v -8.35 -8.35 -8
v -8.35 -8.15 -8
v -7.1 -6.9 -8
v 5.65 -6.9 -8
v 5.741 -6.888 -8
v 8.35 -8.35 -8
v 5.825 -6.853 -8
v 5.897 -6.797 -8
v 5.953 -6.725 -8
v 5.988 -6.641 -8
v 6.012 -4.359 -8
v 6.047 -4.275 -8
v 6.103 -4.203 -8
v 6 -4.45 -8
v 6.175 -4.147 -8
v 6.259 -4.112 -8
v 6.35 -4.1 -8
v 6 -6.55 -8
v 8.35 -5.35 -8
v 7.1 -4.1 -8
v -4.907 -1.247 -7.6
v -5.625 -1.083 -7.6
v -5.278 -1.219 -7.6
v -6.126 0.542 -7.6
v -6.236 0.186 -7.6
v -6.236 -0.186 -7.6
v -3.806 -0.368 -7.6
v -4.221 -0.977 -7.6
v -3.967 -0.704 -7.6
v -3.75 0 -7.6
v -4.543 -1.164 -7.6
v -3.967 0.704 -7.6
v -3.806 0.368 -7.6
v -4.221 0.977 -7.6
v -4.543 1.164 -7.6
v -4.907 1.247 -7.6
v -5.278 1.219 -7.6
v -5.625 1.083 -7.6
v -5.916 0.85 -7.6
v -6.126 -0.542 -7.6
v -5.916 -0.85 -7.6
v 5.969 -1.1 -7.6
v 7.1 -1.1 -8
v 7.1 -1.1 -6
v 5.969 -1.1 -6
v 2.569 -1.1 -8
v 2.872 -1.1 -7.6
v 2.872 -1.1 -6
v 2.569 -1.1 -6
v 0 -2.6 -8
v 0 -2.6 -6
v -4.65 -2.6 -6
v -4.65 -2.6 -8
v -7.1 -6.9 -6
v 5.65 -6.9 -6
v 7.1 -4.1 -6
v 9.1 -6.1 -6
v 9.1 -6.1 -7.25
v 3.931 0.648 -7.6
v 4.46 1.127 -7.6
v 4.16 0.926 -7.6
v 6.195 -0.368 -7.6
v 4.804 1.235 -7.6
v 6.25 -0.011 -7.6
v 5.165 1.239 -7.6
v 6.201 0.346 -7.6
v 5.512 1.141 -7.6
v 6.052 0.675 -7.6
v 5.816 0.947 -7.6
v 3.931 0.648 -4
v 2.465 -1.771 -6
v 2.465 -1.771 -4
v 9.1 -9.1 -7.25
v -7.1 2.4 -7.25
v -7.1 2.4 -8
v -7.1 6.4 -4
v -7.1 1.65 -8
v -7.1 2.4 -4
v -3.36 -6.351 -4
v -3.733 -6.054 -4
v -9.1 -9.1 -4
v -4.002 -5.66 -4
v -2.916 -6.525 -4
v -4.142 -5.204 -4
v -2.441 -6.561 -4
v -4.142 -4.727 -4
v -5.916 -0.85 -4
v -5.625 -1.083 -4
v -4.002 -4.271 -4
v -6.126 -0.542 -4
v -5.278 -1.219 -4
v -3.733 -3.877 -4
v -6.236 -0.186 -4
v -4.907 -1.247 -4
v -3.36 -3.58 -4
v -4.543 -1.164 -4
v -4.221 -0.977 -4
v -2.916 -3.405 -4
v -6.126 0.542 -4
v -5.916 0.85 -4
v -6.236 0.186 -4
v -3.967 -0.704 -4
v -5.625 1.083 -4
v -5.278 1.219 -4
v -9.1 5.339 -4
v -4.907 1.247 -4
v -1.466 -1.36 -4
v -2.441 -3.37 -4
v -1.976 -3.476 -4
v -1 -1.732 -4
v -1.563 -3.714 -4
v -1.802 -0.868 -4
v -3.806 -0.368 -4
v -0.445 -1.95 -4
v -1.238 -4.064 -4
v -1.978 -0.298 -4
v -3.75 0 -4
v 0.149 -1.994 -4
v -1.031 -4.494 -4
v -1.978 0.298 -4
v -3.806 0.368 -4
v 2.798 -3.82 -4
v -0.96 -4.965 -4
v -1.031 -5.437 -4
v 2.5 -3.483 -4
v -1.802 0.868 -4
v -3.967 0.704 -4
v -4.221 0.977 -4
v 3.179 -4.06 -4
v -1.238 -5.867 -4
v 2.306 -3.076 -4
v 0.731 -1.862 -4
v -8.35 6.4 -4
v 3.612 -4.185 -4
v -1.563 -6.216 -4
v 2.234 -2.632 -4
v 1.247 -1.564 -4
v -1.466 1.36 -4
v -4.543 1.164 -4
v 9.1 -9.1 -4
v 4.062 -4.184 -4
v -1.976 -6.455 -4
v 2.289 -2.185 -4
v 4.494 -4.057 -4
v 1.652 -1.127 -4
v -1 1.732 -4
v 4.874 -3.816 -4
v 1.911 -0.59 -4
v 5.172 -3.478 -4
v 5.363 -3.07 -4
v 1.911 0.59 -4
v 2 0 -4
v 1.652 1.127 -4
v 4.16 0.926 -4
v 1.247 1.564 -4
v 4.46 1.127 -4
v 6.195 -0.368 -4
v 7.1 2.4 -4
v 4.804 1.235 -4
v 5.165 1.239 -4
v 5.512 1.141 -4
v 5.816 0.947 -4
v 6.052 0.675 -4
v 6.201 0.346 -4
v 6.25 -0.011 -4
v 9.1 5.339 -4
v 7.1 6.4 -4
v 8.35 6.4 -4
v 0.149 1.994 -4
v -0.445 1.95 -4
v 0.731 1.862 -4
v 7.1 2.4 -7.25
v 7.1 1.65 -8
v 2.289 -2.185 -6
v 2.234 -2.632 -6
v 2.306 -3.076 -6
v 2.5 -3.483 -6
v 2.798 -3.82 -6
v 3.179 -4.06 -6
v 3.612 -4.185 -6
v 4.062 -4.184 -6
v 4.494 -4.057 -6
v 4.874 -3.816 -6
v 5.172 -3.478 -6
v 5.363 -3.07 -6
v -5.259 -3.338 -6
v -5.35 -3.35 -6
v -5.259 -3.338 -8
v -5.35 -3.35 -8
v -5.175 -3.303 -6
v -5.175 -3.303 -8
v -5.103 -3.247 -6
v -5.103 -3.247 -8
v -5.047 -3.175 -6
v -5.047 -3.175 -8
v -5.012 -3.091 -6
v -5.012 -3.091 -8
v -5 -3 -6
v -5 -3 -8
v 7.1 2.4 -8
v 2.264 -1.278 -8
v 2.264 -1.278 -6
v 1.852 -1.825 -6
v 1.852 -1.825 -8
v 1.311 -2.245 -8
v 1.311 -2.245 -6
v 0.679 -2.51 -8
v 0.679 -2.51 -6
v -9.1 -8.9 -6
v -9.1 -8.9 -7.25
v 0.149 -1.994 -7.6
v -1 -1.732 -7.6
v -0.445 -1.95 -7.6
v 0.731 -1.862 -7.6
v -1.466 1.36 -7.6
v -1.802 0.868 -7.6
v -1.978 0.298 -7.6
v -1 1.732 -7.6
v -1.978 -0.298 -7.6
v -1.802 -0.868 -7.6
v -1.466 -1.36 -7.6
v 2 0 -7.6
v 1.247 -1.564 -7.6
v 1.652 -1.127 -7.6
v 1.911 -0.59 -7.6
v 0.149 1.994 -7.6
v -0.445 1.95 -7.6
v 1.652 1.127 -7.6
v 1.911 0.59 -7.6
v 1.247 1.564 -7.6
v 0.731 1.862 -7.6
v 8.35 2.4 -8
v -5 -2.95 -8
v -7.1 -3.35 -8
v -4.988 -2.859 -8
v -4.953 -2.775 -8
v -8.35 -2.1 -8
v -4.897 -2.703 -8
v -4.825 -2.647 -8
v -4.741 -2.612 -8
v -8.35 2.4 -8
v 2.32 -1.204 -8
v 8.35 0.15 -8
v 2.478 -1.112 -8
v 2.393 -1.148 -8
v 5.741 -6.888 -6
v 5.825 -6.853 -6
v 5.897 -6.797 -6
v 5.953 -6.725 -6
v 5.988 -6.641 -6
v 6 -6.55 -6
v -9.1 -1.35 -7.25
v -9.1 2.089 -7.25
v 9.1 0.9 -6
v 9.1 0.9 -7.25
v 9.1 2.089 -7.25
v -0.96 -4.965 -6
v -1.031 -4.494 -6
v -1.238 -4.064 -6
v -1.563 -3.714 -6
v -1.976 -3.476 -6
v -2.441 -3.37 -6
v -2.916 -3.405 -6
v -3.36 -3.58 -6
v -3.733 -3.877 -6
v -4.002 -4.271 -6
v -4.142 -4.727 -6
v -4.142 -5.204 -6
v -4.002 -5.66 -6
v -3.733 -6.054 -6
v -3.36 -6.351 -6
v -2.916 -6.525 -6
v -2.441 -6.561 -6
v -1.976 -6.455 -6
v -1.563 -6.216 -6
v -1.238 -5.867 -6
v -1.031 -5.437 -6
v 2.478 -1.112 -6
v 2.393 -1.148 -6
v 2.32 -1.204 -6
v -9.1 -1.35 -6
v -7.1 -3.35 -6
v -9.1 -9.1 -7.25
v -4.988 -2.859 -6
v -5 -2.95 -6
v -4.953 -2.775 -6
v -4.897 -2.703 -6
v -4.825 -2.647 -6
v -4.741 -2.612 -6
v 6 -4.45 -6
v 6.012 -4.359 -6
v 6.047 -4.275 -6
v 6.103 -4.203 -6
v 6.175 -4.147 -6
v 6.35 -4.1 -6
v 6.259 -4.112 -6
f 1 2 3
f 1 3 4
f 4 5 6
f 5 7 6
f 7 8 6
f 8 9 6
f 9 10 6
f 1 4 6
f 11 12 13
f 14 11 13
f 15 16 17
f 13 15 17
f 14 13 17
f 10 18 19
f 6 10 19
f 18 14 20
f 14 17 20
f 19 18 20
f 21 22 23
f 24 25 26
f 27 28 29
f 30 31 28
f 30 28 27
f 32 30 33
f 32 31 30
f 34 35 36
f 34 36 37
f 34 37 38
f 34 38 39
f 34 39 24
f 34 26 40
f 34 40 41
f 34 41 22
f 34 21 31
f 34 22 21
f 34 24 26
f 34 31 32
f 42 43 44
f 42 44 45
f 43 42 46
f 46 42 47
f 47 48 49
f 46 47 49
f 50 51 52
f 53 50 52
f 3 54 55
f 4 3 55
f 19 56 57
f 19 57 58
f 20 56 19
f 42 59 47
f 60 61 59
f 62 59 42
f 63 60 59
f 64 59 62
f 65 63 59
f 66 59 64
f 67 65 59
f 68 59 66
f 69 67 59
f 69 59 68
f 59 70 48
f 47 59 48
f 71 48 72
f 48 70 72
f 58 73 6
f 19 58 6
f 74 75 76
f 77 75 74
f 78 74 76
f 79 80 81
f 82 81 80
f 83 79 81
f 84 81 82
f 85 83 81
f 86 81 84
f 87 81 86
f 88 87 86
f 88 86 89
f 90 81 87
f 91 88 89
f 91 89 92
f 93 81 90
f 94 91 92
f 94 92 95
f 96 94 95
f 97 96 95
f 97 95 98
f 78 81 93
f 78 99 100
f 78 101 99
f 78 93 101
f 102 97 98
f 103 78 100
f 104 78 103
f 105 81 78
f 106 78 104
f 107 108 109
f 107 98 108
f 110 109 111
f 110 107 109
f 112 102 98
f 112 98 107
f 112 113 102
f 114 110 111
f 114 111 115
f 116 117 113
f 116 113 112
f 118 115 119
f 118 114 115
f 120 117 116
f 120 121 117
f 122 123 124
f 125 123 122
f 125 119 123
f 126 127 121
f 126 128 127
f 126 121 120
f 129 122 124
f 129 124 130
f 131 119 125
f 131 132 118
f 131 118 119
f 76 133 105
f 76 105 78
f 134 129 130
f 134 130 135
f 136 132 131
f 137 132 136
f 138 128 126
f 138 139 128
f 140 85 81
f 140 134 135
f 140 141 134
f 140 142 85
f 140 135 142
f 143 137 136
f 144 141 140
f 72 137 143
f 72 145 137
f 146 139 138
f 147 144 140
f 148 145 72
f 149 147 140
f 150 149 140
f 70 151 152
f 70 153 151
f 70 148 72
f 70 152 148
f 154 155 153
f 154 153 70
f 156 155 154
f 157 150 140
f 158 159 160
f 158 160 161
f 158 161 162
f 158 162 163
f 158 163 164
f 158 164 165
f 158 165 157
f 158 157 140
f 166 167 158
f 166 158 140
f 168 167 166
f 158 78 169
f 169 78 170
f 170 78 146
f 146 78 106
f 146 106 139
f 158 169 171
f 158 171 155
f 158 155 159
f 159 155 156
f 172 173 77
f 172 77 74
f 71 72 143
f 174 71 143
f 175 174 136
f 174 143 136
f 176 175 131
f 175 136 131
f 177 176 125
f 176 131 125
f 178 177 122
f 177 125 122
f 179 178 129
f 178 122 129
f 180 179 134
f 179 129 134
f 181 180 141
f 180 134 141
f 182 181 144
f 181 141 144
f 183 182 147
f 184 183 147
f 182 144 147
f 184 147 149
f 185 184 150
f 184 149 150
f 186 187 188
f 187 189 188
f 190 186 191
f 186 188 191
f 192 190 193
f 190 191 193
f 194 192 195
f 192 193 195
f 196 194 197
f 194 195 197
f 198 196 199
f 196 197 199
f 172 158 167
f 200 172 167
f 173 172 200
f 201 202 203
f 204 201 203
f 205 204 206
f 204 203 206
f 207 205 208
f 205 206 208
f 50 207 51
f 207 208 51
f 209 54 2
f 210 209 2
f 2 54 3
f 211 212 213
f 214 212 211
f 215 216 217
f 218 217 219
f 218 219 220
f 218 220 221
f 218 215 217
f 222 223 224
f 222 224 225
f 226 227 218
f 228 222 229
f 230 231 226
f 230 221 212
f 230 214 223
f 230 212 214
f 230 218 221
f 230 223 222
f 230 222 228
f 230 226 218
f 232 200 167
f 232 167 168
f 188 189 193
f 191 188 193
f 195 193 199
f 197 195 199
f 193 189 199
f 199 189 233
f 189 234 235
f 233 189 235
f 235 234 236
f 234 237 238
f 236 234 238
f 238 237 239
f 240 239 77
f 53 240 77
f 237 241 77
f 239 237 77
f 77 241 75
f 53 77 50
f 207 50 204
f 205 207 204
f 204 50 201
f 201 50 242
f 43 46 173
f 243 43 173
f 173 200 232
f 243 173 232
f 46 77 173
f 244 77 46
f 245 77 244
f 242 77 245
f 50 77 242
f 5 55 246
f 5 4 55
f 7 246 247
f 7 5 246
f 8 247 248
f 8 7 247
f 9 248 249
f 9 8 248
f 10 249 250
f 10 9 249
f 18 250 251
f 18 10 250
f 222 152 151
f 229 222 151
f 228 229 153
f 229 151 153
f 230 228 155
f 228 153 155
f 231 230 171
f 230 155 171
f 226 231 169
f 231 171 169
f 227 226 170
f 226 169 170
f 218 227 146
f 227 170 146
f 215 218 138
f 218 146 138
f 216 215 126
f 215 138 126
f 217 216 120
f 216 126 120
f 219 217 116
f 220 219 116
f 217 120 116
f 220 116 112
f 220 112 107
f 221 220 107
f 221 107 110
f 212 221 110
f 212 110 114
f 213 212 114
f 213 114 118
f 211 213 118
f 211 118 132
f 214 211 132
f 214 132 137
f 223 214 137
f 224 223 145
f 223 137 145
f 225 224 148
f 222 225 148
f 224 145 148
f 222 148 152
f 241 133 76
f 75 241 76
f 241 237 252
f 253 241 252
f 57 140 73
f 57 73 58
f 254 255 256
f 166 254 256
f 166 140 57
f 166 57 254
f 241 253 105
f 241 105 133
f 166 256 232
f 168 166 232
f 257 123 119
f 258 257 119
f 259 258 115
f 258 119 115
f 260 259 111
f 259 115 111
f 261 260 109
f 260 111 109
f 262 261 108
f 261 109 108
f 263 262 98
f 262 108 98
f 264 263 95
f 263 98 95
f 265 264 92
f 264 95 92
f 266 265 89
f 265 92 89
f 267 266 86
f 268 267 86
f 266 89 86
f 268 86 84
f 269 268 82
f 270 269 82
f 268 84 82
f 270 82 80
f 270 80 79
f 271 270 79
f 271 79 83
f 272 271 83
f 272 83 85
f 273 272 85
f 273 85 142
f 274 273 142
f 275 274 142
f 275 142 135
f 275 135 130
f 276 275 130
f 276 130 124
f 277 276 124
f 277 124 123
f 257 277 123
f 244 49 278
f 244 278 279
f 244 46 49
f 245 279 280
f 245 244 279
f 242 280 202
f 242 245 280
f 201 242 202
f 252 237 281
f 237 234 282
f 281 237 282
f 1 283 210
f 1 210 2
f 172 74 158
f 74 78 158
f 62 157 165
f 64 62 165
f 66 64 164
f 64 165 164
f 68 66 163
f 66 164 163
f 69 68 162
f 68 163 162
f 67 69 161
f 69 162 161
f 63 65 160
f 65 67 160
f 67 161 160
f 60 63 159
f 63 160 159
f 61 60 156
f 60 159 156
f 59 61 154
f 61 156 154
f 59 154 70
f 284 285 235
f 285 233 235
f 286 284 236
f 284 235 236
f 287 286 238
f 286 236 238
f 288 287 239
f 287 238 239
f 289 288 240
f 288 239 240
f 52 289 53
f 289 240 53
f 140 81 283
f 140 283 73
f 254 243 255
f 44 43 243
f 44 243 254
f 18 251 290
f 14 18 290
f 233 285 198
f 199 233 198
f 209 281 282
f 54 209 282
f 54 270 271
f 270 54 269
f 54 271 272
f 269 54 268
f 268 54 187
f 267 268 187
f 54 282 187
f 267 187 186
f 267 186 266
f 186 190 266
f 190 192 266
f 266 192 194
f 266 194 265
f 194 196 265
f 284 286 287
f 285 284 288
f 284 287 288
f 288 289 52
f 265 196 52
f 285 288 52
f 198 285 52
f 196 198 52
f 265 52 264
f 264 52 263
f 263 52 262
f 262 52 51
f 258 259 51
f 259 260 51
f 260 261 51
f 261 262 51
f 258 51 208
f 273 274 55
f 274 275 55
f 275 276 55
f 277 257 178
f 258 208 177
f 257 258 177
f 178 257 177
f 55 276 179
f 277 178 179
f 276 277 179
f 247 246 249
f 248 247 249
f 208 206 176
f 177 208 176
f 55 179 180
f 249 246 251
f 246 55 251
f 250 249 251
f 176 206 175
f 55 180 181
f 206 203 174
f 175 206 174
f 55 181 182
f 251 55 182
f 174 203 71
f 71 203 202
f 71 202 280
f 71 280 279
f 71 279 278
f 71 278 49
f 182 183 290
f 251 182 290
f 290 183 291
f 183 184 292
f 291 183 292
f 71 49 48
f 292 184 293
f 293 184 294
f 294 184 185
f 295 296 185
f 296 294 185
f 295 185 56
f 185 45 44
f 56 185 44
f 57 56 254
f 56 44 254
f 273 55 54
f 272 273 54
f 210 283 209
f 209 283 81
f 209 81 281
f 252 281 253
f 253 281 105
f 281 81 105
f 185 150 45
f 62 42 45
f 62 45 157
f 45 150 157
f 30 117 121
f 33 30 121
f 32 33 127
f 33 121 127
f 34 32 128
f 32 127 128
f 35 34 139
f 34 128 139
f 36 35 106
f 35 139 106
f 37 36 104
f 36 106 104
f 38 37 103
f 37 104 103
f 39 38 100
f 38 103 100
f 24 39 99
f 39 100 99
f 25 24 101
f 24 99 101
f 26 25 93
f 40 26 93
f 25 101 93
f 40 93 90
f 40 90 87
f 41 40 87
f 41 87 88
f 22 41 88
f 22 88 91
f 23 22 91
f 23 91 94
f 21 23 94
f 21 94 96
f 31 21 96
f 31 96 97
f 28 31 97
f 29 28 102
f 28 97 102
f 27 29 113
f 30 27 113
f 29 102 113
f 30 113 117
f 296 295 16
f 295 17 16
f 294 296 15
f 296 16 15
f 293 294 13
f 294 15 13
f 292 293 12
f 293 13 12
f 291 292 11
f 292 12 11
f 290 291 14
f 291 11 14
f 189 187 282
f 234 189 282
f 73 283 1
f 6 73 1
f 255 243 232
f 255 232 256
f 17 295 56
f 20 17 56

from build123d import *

# Parameters (mm, degrees)
OUTER_FRAME_EXTRUDE_DEPTH      = 4
OUTER_FRAME_EXTRUDE_DEPTH_BACK = 2
OUTSIDE_FRAME_W                = 18.2
OUTSIDE_FRAME_H                = 18.2
OUTSIDE_FRAME_W_2              = 14.2
OUTSIDE_FRAME_H_2              = 14.2
HOTSWAP_BASE_W                 = 18.2
HOTSWAP_BASE_H                 = 11.5
HOTSWAP_BASE_BLOCK_DEPTH       = 4
CUT_EXTRUDE4_DEPTH             = 16.15321748
CUT_EXTRUDE4_DEPTH_BACK        = 16.15321748
SKETCH1_W                      = 2
SKETCH1_H                      = 6.7
CUT_EXTRUDE1_DEPTH             = 4
SWITCH_PIN_HOLES_R             = 2
SWITCH_PIN_HOLES_R_2           = 1.25
SWITCH_HOLES_DEPTH             = 3.6
CUT_EXTRUDE3_REACH             = 17.153
HOTSWAP_HOLES_R                = 1.6
CHAMFER1_SIZE                  = 2
CHAMFER2_SIZE                  = 4
FILLET1_R                      = 0.35
CHAMFER3_SIZE                  = 0.75


# Some blends are built 0.0001 mm under size
with BuildPart() as part:
    # Outside Frame → Outer Frame Extrude (new, two sides: drawn at the far end of the back side and taken through both)
    with BuildSketch(Plane.XY.offset(-4).offset(-OUTER_FRAME_EXTRUDE_DEPTH_BACK)):
        Rectangle(OUTSIDE_FRAME_W, OUTSIDE_FRAME_H)
        Rectangle(OUTSIDE_FRAME_W_2, OUTSIDE_FRAME_H_2, mode=Mode.SUBTRACT)
    extrude(amount=OUTER_FRAME_EXTRUDE_DEPTH + OUTER_FRAME_EXTRUDE_DEPTH_BACK)

    # Hotswap Base → Hotswap Base Block (add)
    with BuildSketch(Plane.XY.offset(-4)):
        with Locations((0, -3.35)):
            Rectangle(HOTSWAP_BASE_W, HOTSWAP_BASE_H)
    extrude(amount=-HOTSWAP_BASE_BLOCK_DEPTH)

    # Sketch1 → Cut-Extrude4 (cut, two sides: drawn at the far end of the back side and taken through both)
    with BuildSketch(Plane(origin=(0, 0, 0), x_dir=(0, 0, -1), z_dir=(1, 0, 0)).offset(-CUT_EXTRUDE4_DEPTH_BACK)):
        with Locations((5, 5.75)):
            Rectangle(SKETCH1_W, SKETCH1_H)
    extrude(amount=CUT_EXTRUDE4_DEPTH + CUT_EXTRUDE4_DEPTH_BACK, mode=Mode.SUBTRACT)

    # Hotswap Well → Cut-Extrude1 (cut)
    with BuildSketch(Plane(origin=(0, 0, -6), x_dir=(-1, 0, 0), z_dir=(0, 0, -1))):
        with BuildLine():
            Line((-10, -1.1), (-2.355843798, -1.1))
            ThreePointArc((-2.355843798, -1.1), (-1.396424004, -2.19317122), (0, -2.6))
            Line((0, -2.6), (5, -2.6))
            Line((5, -2.6), (5, -3.35))
            Line((5, -3.35), (10, -3.35))
            Line((10, -3.35), (10, -6.9))
            Line((10, -6.9), (-6, -6.9))
            Line((-6, -6.9), (-6, -4.1))
            Line((-6, -4.1), (-10, -4.1))
            Line((-10, -4.1), (-10, -1.1))
        make_face()
    extrude(amount=CUT_EXTRUDE1_DEPTH, mode=Mode.SUBTRACT)

    # Switch Pin Holes → Switch Holes (cut)
    with BuildSketch(Plane.XY.offset(-4)):
        Circle(SWITCH_PIN_HOLES_R)
        with Locations((-5, 0)):
            Circle(SWITCH_PIN_HOLES_R_2)
        with Locations((5, 0)):
            Circle(SWITCH_PIN_HOLES_R_2)
    extrude(amount=-SWITCH_HOLES_DEPTH, mode=Mode.SUBTRACT)

    # Cut-Extrude3: up to this face of the body (flat: up to its plane)
    cut_extrude3_end = Plane(part.part.faces().sort_by_distance((5, 0.029137252, -7.6))[0])
    # Hotswap Holes → Cut-Extrude3 (cut, up to the picked face)
    with BuildSketch(Plane.XY, mode=Mode.PRIVATE) as cut_extrude3_sk1:
        with Locations((-2.560136595, -4.965291588)):
            Circle(HOTSWAP_HOLES_R)
    cut_extrude3_tool1 = split(extrude(cut_extrude3_sk1.sketch, amount=-CUT_EXTRUDE3_REACH, mode=Mode.PRIVATE), bisect_by=cut_extrude3_end, keep=Keep.BOTH, mode=Mode.PRIVATE)
    # Hotswap Holes → Cut-Extrude3 (cut, up to the picked face)
    with BuildSketch(Plane.XY, mode=Mode.PRIVATE) as cut_extrude3_sk2:
        with BuildLine():
            Line((3.930924016, 0.647747281), (2.46548889, -1.77088348))
            ThreePointArc((2.46548889, -1.77088348), (3.179147124, -4.059894044), (5.3631684, -3.070485887))
            Line((5.3631684, -3.070485887), (6.194736133, -0.367567099))
            ThreePointArc((6.194736133, -0.367567099), (5.511530489, 1.140542222), (3.930924016, 0.647747281))
        make_face()
    cut_extrude3_tool2 = split(extrude(cut_extrude3_sk2.sketch, amount=-CUT_EXTRUDE3_REACH, mode=Mode.PRIVATE), bisect_by=cut_extrude3_end, keep=Keep.BOTH, mode=Mode.PRIVATE)
    add(cut_extrude3_tool1.solids().sort_by(Axis((-2.560137, -4.965292, 0), (0, 0, -1)))[0], mode=Mode.SUBTRACT)
    add(cut_extrude3_tool2.solids().sort_by(Axis((4.301523, -1.557372, 0), (0, 0, -1)))[0], mode=Mode.SUBTRACT)

    # Chamfer1
    chamfer1_edges = [part.edges().sort_by_distance(p)[0] for p in [
        (9.1, -4.1, -7),
        (-9.1, -6.9, -7),
        (-9.1, -3.35, -7),
        (9.1, -1.1, -7),
    ]]
    chamfer(chamfer1_edges, length=CHAMFER1_SIZE)

    # Chamfer2
    chamfer2_edges = [part.edges().sort_by_distance(p)[0] for p in [
        (-8.1, 2.4, -4),
        (8.1, 2.4, -4),
    ]]
    chamfer(chamfer2_edges, length=CHAMFER2_SIZE - 0.0001)  # a hair under: the kernel refuses the full size

    # Fillet1
    fillet1_edges = [part.edges().sort_by_distance(p)[0] for p in [
        (6, -4.1, -7),
        (-5, -3.35, -7),
        (-5, -2.6, -7),
        (6, -6.9, -7),
        (2.355843798, -1.1, -7),
    ]]
    fillet(fillet1_edges, radius=FILLET1_R)

    # Chamfer3
    # the kernel refuses this chamfer: 0.75 mm, written as the material it takes off along each edge
    with BuildSketch(Plane(origin=(9.1, 4.328762241, -8), x_dir=(-0.9996219169112965, 0, -0.02749587661058676), z_dir=(0, -1, 0))) as chamfer3_piece_1:
        Polygon((CHAMFER3_SIZE * 0.999621916911, -CHAMFER3_SIZE * 0.0274958766106), (-CHAMFER3_SIZE * 0.0274958766106, -CHAMFER3_SIZE * 0.999621916911), (0, 0), align=None)
    extrude(amount=5.357524482, mode=Mode.SUBTRACT)
    with BuildSketch(Plane(origin=(-9.1, -3.278762241, -8), x_dir=(0.9996219169112965, 0, -0.02749587661058676), z_dir=(0, 1, 0))) as chamfer3_piece_2:
        Polygon((CHAMFER3_SIZE * 0.999621916911, -CHAMFER3_SIZE * 0.0274958766106), (-CHAMFER3_SIZE * 0.0274958766106, -CHAMFER3_SIZE * 0.999621916911), (0, 0), align=None)
    extrude(amount=7.607524482, mode=Mode.SUBTRACT)
    with BuildSketch(Plane(origin=(-9.1, -11.028762241, -8), x_dir=(-0.027495876610586768, 0, 0.9996219169112968), z_dir=(0, 1, 0))) as chamfer3_piece_3:
        Polygon((CHAMFER3_SIZE * 0.999621916911, CHAMFER3_SIZE * 0.0274958766106), (-CHAMFER3_SIZE * 0.0274958766106, CHAMFER3_SIZE * 0.999621916911), (0, 0), align=None)
    extrude(amount=4.057524482, mode=Mode.SUBTRACT)
    with BuildSketch(Plane(origin=(9.1, -4.171237759, -8), x_dir=(0.027495876610586768, 0, 0.9996219169112968), z_dir=(0, -1, 0))) as chamfer3_piece_4:
        Polygon((CHAMFER3_SIZE * 0.999621916911, CHAMFER3_SIZE * 0.0274958766106), (-CHAMFER3_SIZE * 0.0274958766106, CHAMFER3_SIZE * 0.999621916911), (0, 0), align=None)
    extrude(amount=6.857524482, mode=Mode.SUBTRACT)
    with BuildSketch(Plane(origin=(11.028762241, -9.1, -8), x_dir=(0, -0.027495876610586768, 0.9996219169112968), z_dir=(-1, 0, 0))) as chamfer3_piece_5:
        Polygon((CHAMFER3_SIZE * 0.999621916911, CHAMFER3_SIZE * 0.0274958766106), (-CHAMFER3_SIZE * 0.0274958766106, CHAMFER3_SIZE * 0.999621916911), (0, 0), align=None)
    extrude(amount=22.057524482, mode=Mode.SUBTRACT)
    with BuildSketch(Plane(origin=(-11.028762241, 2.4, -8), x_dir=(0, -0.9996219169112968, -0.027495876610586775), z_dir=(1, 0, 0))) as chamfer3_piece_6_section:
        Polygon((CHAMFER3_SIZE * 0.999621916911, -CHAMFER3_SIZE * 0.0274958766106), (-CHAMFER3_SIZE * 0.0274958766106, -CHAMFER3_SIZE * 0.999621916911), (0, 0), align=None)
    chamfer3_piece_6 = extrude(amount=22.057524482, mode=Mode.PRIVATE)
    chamfer3_piece_6 = split(chamfer3_piece_6, bisect_by=Plane(origin=(7.1, 2.149999996, -7.749999996), z_dir=(-1, 0, 0)), keep=Keep.TOP, mode=Mode.PRIVATE)
    chamfer3_piece_6 = split(chamfer3_piece_6, bisect_by=Plane(origin=(-7.1, 2.149999996, -7.749999996), z_dir=(1, 0, 0)), keep=Keep.TOP, mode=Mode.PRIVATE)
    add(chamfer3_piece_6, mode=Mode.SUBTRACT)
    with BuildSketch(Plane(origin=(9.1, 7.76374086, -2.63615914), x_dir=(0.02749587661058679, -0.7068394360706739, 0.706839436070673), z_dir=(0, -0.7071067811865471, -0.7071067811865479))) as chamfer3_piece_7_section:
        Polygon((CHAMFER3_SIZE * 0.999621916911, CHAMFER3_SIZE * 0.0274958766106), (-CHAMFER3_SIZE * 0.0274958766106, CHAMFER3_SIZE * 0.999621916911), (0, 0), align=None)
    chamfer3_piece_7 = extrude(amount=9.51423731, mode=Mode.PRIVATE)
    chamfer3_piece_7 = split(chamfer3_piece_7, bisect_by=Plane(origin=(8.843939938, 4.231743527, -4), z_dir=(0, 0, -1)), keep=Keep.TOP, mode=Mode.PRIVATE)
    add(chamfer3_piece_7, mode=Mode.SUBTRACT)
    with BuildSketch(Plane(origin=(-9.1, 7.76374086, -2.63615914), x_dir=(-0.027495876610586768, -0.7068394360706739, 0.706839436070673), z_dir=(0, -0.7071067811865471, -0.7071067811865479))) as chamfer3_piece_8_section:
        Polygon((CHAMFER3_SIZE * 0.999621916911, -CHAMFER3_SIZE * 0.0274958766106), (-CHAMFER3_SIZE * 0.0274958766106, -CHAMFER3_SIZE * 0.999621916911), (0, 0), align=None)
    chamfer3_piece_8 = extrude(amount=9.51423731, mode=Mode.PRIVATE)
    chamfer3_piece_8 = split(chamfer3_piece_8, bisect_by=Plane(origin=(-8.843939938, 4.231743527, -4), z_dir=(0, 0, -1)), keep=Keep.TOP, mode=Mode.PRIVATE)
    add(chamfer3_piece_8, mode=Mode.SUBTRACT)

    # Split1
    split(bisect_by=Plane.XY.offset(-4), keep=Keep.BOTTOM)


solid = part.part
